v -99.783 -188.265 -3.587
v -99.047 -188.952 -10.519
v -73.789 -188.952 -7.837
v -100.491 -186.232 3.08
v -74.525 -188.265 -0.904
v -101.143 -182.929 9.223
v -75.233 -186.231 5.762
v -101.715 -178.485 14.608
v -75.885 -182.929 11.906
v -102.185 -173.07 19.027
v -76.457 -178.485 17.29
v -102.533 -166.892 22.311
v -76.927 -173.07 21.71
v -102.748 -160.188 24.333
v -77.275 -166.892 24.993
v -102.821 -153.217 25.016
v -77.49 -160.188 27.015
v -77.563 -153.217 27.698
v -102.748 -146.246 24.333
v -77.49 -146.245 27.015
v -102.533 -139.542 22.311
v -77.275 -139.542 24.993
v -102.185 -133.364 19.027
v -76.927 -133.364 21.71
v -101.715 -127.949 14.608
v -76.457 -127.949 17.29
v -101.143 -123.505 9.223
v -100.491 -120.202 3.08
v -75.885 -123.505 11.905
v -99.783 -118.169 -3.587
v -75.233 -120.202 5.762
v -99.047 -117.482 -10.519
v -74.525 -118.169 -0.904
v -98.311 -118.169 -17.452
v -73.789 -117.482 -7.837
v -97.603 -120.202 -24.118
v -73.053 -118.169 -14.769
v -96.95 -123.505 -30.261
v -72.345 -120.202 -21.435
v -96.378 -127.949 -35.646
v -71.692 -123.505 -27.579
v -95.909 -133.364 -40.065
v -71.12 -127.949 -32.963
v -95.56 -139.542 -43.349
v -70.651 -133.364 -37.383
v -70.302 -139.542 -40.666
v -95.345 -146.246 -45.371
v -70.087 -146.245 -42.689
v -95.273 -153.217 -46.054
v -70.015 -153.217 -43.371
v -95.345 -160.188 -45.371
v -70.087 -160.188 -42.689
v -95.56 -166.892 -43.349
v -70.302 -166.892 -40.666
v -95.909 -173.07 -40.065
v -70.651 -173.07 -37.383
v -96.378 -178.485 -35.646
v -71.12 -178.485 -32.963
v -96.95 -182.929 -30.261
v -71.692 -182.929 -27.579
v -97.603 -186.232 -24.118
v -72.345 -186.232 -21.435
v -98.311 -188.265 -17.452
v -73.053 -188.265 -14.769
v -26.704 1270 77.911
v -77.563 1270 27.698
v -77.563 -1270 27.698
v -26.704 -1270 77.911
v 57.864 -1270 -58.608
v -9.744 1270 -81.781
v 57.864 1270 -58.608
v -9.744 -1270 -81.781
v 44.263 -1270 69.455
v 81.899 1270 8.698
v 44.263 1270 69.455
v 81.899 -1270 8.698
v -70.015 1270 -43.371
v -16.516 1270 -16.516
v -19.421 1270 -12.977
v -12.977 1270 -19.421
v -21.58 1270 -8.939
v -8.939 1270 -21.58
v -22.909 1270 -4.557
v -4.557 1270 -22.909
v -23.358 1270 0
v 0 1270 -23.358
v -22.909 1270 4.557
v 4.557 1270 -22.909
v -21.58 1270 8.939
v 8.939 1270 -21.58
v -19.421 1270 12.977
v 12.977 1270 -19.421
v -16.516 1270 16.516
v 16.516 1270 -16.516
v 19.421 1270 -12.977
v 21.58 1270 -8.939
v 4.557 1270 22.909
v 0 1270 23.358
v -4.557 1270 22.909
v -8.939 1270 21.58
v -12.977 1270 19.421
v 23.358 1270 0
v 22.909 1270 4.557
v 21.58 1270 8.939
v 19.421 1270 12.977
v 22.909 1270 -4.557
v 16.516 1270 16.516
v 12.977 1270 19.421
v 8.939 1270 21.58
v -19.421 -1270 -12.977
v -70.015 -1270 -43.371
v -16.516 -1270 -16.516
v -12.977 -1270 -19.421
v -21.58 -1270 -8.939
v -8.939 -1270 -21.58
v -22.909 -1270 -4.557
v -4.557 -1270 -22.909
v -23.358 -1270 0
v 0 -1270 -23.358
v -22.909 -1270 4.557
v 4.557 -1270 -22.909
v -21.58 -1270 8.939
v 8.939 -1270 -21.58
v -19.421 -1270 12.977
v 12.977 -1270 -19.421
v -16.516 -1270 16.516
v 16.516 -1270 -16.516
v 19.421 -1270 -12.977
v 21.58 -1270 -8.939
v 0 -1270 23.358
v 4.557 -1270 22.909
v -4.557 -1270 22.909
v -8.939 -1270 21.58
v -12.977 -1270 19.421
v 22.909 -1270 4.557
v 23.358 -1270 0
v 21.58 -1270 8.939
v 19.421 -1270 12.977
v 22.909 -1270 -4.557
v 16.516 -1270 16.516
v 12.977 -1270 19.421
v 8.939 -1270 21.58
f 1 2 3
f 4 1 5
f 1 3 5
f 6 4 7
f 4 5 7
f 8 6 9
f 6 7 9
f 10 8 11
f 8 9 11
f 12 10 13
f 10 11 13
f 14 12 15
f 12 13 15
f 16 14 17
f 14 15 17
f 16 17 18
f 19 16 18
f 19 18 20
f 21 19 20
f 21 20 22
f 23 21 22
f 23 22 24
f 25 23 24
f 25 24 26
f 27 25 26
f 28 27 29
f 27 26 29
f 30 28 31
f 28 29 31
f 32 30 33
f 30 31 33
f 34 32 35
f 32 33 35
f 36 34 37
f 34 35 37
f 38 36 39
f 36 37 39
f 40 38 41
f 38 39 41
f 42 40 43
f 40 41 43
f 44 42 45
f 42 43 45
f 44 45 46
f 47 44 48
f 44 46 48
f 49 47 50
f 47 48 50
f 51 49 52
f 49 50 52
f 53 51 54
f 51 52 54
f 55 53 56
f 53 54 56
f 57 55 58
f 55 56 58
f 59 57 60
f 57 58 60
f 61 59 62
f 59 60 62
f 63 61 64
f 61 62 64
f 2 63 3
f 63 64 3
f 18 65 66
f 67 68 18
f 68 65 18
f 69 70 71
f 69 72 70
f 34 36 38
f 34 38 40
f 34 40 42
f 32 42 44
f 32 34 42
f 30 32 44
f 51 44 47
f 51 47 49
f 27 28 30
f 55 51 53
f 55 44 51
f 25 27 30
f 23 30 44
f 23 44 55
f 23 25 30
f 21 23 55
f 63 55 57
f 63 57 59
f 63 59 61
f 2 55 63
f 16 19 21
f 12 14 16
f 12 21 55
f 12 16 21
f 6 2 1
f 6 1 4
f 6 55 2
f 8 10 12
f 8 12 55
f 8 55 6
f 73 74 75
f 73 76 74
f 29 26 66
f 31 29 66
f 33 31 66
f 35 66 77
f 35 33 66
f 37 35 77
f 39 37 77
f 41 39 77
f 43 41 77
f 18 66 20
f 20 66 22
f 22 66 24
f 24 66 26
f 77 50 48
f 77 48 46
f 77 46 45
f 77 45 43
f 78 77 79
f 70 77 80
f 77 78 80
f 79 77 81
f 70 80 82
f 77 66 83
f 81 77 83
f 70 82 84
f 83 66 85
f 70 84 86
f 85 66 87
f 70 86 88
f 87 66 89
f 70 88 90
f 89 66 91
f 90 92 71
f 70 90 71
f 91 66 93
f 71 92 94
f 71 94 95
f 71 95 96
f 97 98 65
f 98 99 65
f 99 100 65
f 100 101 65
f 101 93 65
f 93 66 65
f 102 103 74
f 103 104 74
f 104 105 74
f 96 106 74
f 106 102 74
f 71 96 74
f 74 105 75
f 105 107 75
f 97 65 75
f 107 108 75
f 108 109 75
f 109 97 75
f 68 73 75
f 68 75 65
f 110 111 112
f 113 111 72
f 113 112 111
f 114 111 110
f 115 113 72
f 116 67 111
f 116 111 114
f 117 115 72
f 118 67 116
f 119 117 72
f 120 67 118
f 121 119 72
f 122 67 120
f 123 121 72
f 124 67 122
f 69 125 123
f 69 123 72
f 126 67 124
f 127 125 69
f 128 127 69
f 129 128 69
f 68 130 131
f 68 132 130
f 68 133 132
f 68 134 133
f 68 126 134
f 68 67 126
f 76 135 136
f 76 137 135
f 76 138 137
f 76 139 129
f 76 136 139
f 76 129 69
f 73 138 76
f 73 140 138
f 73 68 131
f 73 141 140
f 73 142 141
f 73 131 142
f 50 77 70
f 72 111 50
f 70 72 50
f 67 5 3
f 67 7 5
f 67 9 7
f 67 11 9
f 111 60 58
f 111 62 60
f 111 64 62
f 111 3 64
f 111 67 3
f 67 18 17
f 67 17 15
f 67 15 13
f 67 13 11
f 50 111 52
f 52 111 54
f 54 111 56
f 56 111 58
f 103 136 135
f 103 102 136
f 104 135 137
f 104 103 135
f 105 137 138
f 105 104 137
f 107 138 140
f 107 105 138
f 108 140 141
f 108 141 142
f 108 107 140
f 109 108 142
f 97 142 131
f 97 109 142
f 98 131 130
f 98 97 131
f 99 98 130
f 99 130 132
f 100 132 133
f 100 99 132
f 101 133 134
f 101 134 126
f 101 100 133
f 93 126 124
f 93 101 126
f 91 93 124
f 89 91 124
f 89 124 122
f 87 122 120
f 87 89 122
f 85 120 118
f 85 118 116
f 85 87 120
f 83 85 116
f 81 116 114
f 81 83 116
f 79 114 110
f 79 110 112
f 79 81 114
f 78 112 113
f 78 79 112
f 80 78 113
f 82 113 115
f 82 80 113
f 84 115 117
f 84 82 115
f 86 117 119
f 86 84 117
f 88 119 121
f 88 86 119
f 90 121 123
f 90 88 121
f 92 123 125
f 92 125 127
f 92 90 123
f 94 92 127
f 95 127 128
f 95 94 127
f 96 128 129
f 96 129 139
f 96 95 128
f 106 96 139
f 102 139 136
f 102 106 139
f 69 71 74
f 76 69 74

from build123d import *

# Parameters (mm, degrees)
F1_R     = 23.3578357485
F2_DEPTH = 1270
F3_R     = 35.7346583213
F4_DEPTH = 25.4


with BuildPart() as f2:
    # F1 (on face) → F2 (new body, symmetric)
    with BuildSketch(Plane.XZ):
        Polygon((81.899409343, 8.6979254562), (44.2631345498, 69.4546044391), (-26.7041833628, 77.9105496637), (-77.5627065371, 27.6982619059), (-70.0149296982, -43.3713820086), (-9.7444827522, -81.7814906557), (57.8637584574, -58.6084688007), align=None)
        Circle(F1_R, mode=Mode.SUBTRACT)
    extrude(amount=F2_DEPTH, both=True)

    # F3 (on face) → F4 (join)
    with BuildSketch(Plane(origin=(-73.7888181177, 0, -7.8365600513), x_dir=(0, -1, 0), z_dir=(-0.9944077718, 0, -0.1056086331))):
        with Locations((153.2169878483, 0)):
            Circle(F3_R)
    extrude(amount=F4_DEPTH)


solid = f2.part
